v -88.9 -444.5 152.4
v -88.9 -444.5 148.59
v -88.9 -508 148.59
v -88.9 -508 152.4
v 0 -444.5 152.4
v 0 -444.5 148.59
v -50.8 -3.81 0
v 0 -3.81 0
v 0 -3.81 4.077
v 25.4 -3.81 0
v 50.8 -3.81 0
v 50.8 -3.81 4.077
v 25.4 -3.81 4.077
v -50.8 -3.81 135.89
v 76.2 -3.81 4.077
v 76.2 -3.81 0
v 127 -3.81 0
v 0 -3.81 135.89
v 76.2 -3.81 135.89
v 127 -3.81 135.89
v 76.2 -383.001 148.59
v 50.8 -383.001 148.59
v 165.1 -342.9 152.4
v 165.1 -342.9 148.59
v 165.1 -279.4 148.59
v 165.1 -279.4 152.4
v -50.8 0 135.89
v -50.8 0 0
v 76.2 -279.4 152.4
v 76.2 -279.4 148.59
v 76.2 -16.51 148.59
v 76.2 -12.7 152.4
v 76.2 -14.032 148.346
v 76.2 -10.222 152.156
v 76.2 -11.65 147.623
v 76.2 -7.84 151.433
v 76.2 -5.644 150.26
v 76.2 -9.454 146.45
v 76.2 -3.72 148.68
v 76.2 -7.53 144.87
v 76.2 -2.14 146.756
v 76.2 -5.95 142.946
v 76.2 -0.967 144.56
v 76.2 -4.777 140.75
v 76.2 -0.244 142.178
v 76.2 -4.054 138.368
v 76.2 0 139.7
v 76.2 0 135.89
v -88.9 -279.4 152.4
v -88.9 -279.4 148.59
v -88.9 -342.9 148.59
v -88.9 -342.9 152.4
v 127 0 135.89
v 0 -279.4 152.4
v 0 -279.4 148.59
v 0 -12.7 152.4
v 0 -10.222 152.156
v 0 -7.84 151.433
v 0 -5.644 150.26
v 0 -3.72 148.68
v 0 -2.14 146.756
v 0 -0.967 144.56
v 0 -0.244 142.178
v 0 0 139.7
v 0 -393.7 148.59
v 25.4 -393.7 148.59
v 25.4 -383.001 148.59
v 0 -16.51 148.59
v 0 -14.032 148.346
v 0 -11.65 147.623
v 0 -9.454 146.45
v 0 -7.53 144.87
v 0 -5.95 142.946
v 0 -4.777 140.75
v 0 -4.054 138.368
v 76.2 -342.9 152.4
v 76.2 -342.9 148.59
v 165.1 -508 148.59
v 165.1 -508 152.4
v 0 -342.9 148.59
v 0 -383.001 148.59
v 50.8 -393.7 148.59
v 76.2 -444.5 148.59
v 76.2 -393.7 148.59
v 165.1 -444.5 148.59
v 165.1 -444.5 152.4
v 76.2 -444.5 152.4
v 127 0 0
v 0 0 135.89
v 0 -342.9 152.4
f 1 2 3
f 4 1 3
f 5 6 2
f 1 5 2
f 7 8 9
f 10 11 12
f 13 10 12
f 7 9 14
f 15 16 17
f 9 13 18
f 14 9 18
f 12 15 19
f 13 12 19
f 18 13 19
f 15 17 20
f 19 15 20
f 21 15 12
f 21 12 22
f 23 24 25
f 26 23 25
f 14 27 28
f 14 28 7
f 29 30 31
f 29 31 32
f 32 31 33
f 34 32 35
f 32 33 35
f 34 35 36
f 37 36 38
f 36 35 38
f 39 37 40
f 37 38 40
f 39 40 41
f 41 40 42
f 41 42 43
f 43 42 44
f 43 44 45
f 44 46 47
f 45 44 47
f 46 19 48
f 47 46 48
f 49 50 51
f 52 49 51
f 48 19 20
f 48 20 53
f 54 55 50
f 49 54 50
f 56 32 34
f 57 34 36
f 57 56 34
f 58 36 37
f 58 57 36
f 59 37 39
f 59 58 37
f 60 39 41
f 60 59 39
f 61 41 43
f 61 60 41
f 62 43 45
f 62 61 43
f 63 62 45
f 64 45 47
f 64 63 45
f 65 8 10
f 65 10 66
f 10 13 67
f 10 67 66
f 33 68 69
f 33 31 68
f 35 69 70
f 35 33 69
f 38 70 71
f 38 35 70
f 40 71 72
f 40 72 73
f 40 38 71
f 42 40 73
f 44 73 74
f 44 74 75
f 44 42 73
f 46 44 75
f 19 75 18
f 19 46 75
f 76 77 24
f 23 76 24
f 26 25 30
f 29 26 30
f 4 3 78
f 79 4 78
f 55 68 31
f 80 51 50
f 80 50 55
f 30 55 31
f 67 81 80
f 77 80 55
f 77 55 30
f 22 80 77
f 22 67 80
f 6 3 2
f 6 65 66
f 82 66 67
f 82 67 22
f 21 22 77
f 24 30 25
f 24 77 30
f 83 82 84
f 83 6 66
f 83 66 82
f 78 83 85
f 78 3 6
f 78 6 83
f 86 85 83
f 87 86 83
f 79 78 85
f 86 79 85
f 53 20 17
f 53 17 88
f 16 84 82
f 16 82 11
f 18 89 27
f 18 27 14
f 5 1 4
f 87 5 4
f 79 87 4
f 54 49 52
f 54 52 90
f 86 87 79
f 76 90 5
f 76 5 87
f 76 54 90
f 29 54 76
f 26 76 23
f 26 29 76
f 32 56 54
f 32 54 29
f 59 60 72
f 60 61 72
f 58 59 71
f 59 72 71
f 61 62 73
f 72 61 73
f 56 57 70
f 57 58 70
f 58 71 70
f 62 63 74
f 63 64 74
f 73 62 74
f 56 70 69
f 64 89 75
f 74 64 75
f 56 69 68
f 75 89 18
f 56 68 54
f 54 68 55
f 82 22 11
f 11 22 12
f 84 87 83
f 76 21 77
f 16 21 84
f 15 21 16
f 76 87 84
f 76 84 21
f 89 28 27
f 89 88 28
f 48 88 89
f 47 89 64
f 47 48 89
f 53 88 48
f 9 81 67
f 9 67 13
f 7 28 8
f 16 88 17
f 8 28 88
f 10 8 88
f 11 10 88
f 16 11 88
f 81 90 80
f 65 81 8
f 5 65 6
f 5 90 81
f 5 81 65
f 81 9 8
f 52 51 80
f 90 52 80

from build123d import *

# Parameters (mm, degrees)
F1_DEPTH  = 152.4
F2_W      = 254
F2_H      = 148.59
F3_DEPTH  = 504.19
F4_R      = 12.7
F5_W      = 3.81
F5_H      = 135.89
F6_DEPTH  = 50.8
F7_W      = 3.81
F7_H      = 135.89
F8_DEPTH  = 50.8
F10_DEPTH = 25.4
F12_DEPTH = 25.4


with BuildPart() as f1:
    # F0 (on Top) → F1 (new body)
    with BuildSketch(Plane.XY):
        Polygon((-88.9, -508), (165.1, -508), (165.1, -444.5), (76.2, -444.5), (76.2, -342.9), (165.1, -342.9), (165.1, -279.4), (76.2, -279.4), (76.2, 0), (0, 0), (0, -279.4), (-88.9, -279.4), (-88.9, -342.9), (0, -342.9), (0, -444.5), (-88.9, -444.5), align=None)
    extrude(amount=F1_DEPTH)

    # F2 (on face) → F3 (cut)
    with BuildSketch(Plane.XZ.offset(508)):
        with Locations((38.1, 74.295)):
            Rectangle(F2_W, F2_H)
    extrude(amount=-F3_DEPTH, mode=Mode.SUBTRACT)

    # F4
    f4_edges = [f1.edges().sort_by_distance(p)[0] for p in [
        (38.1, 0, 152.4),
        (38.1, -3.81, 148.59),
    ]]
    fillet(f4_edges, radius=F4_R)

    # F5 (on face) → F6 (join)
    with BuildSketch(Plane.YZ.offset(76.2)):
        with Locations((-1.905, 67.945)):
            Rectangle(F5_W, F5_H)
    extrude(amount=F6_DEPTH)

    # F7 (on face) → F8 (join)
    with BuildSketch(Plane(origin=(0, 0, 0), x_dir=(0, -1, 0), z_dir=(-1, 0, 0))):
        with Locations((1.905, 67.945)):
            Rectangle(F7_W, F7_H)
    extrude(amount=F8_DEPTH)

    # F9 (on face) → F10 (join)
    with BuildSketch(Plane.YZ.offset(76.2)):
        Polygon((-393.7, 148.59), (-3.81, 0), (-3.81, 4.07731), (-383.001416, 148.59), align=None)
    extrude(amount=-F10_DEPTH)

    # F11 (on face) → F12 (join)
    with BuildSketch(Plane(origin=(0, 0, 0), x_dir=(0, -1, 0), z_dir=(-1, 0, 0))):
        Polygon((3.81, 0), (393.7, 148.59), (383.001416, 148.59), (3.81, 4.07731), align=None)
    extrude(amount=-F12_DEPTH)


solid = f1.part
